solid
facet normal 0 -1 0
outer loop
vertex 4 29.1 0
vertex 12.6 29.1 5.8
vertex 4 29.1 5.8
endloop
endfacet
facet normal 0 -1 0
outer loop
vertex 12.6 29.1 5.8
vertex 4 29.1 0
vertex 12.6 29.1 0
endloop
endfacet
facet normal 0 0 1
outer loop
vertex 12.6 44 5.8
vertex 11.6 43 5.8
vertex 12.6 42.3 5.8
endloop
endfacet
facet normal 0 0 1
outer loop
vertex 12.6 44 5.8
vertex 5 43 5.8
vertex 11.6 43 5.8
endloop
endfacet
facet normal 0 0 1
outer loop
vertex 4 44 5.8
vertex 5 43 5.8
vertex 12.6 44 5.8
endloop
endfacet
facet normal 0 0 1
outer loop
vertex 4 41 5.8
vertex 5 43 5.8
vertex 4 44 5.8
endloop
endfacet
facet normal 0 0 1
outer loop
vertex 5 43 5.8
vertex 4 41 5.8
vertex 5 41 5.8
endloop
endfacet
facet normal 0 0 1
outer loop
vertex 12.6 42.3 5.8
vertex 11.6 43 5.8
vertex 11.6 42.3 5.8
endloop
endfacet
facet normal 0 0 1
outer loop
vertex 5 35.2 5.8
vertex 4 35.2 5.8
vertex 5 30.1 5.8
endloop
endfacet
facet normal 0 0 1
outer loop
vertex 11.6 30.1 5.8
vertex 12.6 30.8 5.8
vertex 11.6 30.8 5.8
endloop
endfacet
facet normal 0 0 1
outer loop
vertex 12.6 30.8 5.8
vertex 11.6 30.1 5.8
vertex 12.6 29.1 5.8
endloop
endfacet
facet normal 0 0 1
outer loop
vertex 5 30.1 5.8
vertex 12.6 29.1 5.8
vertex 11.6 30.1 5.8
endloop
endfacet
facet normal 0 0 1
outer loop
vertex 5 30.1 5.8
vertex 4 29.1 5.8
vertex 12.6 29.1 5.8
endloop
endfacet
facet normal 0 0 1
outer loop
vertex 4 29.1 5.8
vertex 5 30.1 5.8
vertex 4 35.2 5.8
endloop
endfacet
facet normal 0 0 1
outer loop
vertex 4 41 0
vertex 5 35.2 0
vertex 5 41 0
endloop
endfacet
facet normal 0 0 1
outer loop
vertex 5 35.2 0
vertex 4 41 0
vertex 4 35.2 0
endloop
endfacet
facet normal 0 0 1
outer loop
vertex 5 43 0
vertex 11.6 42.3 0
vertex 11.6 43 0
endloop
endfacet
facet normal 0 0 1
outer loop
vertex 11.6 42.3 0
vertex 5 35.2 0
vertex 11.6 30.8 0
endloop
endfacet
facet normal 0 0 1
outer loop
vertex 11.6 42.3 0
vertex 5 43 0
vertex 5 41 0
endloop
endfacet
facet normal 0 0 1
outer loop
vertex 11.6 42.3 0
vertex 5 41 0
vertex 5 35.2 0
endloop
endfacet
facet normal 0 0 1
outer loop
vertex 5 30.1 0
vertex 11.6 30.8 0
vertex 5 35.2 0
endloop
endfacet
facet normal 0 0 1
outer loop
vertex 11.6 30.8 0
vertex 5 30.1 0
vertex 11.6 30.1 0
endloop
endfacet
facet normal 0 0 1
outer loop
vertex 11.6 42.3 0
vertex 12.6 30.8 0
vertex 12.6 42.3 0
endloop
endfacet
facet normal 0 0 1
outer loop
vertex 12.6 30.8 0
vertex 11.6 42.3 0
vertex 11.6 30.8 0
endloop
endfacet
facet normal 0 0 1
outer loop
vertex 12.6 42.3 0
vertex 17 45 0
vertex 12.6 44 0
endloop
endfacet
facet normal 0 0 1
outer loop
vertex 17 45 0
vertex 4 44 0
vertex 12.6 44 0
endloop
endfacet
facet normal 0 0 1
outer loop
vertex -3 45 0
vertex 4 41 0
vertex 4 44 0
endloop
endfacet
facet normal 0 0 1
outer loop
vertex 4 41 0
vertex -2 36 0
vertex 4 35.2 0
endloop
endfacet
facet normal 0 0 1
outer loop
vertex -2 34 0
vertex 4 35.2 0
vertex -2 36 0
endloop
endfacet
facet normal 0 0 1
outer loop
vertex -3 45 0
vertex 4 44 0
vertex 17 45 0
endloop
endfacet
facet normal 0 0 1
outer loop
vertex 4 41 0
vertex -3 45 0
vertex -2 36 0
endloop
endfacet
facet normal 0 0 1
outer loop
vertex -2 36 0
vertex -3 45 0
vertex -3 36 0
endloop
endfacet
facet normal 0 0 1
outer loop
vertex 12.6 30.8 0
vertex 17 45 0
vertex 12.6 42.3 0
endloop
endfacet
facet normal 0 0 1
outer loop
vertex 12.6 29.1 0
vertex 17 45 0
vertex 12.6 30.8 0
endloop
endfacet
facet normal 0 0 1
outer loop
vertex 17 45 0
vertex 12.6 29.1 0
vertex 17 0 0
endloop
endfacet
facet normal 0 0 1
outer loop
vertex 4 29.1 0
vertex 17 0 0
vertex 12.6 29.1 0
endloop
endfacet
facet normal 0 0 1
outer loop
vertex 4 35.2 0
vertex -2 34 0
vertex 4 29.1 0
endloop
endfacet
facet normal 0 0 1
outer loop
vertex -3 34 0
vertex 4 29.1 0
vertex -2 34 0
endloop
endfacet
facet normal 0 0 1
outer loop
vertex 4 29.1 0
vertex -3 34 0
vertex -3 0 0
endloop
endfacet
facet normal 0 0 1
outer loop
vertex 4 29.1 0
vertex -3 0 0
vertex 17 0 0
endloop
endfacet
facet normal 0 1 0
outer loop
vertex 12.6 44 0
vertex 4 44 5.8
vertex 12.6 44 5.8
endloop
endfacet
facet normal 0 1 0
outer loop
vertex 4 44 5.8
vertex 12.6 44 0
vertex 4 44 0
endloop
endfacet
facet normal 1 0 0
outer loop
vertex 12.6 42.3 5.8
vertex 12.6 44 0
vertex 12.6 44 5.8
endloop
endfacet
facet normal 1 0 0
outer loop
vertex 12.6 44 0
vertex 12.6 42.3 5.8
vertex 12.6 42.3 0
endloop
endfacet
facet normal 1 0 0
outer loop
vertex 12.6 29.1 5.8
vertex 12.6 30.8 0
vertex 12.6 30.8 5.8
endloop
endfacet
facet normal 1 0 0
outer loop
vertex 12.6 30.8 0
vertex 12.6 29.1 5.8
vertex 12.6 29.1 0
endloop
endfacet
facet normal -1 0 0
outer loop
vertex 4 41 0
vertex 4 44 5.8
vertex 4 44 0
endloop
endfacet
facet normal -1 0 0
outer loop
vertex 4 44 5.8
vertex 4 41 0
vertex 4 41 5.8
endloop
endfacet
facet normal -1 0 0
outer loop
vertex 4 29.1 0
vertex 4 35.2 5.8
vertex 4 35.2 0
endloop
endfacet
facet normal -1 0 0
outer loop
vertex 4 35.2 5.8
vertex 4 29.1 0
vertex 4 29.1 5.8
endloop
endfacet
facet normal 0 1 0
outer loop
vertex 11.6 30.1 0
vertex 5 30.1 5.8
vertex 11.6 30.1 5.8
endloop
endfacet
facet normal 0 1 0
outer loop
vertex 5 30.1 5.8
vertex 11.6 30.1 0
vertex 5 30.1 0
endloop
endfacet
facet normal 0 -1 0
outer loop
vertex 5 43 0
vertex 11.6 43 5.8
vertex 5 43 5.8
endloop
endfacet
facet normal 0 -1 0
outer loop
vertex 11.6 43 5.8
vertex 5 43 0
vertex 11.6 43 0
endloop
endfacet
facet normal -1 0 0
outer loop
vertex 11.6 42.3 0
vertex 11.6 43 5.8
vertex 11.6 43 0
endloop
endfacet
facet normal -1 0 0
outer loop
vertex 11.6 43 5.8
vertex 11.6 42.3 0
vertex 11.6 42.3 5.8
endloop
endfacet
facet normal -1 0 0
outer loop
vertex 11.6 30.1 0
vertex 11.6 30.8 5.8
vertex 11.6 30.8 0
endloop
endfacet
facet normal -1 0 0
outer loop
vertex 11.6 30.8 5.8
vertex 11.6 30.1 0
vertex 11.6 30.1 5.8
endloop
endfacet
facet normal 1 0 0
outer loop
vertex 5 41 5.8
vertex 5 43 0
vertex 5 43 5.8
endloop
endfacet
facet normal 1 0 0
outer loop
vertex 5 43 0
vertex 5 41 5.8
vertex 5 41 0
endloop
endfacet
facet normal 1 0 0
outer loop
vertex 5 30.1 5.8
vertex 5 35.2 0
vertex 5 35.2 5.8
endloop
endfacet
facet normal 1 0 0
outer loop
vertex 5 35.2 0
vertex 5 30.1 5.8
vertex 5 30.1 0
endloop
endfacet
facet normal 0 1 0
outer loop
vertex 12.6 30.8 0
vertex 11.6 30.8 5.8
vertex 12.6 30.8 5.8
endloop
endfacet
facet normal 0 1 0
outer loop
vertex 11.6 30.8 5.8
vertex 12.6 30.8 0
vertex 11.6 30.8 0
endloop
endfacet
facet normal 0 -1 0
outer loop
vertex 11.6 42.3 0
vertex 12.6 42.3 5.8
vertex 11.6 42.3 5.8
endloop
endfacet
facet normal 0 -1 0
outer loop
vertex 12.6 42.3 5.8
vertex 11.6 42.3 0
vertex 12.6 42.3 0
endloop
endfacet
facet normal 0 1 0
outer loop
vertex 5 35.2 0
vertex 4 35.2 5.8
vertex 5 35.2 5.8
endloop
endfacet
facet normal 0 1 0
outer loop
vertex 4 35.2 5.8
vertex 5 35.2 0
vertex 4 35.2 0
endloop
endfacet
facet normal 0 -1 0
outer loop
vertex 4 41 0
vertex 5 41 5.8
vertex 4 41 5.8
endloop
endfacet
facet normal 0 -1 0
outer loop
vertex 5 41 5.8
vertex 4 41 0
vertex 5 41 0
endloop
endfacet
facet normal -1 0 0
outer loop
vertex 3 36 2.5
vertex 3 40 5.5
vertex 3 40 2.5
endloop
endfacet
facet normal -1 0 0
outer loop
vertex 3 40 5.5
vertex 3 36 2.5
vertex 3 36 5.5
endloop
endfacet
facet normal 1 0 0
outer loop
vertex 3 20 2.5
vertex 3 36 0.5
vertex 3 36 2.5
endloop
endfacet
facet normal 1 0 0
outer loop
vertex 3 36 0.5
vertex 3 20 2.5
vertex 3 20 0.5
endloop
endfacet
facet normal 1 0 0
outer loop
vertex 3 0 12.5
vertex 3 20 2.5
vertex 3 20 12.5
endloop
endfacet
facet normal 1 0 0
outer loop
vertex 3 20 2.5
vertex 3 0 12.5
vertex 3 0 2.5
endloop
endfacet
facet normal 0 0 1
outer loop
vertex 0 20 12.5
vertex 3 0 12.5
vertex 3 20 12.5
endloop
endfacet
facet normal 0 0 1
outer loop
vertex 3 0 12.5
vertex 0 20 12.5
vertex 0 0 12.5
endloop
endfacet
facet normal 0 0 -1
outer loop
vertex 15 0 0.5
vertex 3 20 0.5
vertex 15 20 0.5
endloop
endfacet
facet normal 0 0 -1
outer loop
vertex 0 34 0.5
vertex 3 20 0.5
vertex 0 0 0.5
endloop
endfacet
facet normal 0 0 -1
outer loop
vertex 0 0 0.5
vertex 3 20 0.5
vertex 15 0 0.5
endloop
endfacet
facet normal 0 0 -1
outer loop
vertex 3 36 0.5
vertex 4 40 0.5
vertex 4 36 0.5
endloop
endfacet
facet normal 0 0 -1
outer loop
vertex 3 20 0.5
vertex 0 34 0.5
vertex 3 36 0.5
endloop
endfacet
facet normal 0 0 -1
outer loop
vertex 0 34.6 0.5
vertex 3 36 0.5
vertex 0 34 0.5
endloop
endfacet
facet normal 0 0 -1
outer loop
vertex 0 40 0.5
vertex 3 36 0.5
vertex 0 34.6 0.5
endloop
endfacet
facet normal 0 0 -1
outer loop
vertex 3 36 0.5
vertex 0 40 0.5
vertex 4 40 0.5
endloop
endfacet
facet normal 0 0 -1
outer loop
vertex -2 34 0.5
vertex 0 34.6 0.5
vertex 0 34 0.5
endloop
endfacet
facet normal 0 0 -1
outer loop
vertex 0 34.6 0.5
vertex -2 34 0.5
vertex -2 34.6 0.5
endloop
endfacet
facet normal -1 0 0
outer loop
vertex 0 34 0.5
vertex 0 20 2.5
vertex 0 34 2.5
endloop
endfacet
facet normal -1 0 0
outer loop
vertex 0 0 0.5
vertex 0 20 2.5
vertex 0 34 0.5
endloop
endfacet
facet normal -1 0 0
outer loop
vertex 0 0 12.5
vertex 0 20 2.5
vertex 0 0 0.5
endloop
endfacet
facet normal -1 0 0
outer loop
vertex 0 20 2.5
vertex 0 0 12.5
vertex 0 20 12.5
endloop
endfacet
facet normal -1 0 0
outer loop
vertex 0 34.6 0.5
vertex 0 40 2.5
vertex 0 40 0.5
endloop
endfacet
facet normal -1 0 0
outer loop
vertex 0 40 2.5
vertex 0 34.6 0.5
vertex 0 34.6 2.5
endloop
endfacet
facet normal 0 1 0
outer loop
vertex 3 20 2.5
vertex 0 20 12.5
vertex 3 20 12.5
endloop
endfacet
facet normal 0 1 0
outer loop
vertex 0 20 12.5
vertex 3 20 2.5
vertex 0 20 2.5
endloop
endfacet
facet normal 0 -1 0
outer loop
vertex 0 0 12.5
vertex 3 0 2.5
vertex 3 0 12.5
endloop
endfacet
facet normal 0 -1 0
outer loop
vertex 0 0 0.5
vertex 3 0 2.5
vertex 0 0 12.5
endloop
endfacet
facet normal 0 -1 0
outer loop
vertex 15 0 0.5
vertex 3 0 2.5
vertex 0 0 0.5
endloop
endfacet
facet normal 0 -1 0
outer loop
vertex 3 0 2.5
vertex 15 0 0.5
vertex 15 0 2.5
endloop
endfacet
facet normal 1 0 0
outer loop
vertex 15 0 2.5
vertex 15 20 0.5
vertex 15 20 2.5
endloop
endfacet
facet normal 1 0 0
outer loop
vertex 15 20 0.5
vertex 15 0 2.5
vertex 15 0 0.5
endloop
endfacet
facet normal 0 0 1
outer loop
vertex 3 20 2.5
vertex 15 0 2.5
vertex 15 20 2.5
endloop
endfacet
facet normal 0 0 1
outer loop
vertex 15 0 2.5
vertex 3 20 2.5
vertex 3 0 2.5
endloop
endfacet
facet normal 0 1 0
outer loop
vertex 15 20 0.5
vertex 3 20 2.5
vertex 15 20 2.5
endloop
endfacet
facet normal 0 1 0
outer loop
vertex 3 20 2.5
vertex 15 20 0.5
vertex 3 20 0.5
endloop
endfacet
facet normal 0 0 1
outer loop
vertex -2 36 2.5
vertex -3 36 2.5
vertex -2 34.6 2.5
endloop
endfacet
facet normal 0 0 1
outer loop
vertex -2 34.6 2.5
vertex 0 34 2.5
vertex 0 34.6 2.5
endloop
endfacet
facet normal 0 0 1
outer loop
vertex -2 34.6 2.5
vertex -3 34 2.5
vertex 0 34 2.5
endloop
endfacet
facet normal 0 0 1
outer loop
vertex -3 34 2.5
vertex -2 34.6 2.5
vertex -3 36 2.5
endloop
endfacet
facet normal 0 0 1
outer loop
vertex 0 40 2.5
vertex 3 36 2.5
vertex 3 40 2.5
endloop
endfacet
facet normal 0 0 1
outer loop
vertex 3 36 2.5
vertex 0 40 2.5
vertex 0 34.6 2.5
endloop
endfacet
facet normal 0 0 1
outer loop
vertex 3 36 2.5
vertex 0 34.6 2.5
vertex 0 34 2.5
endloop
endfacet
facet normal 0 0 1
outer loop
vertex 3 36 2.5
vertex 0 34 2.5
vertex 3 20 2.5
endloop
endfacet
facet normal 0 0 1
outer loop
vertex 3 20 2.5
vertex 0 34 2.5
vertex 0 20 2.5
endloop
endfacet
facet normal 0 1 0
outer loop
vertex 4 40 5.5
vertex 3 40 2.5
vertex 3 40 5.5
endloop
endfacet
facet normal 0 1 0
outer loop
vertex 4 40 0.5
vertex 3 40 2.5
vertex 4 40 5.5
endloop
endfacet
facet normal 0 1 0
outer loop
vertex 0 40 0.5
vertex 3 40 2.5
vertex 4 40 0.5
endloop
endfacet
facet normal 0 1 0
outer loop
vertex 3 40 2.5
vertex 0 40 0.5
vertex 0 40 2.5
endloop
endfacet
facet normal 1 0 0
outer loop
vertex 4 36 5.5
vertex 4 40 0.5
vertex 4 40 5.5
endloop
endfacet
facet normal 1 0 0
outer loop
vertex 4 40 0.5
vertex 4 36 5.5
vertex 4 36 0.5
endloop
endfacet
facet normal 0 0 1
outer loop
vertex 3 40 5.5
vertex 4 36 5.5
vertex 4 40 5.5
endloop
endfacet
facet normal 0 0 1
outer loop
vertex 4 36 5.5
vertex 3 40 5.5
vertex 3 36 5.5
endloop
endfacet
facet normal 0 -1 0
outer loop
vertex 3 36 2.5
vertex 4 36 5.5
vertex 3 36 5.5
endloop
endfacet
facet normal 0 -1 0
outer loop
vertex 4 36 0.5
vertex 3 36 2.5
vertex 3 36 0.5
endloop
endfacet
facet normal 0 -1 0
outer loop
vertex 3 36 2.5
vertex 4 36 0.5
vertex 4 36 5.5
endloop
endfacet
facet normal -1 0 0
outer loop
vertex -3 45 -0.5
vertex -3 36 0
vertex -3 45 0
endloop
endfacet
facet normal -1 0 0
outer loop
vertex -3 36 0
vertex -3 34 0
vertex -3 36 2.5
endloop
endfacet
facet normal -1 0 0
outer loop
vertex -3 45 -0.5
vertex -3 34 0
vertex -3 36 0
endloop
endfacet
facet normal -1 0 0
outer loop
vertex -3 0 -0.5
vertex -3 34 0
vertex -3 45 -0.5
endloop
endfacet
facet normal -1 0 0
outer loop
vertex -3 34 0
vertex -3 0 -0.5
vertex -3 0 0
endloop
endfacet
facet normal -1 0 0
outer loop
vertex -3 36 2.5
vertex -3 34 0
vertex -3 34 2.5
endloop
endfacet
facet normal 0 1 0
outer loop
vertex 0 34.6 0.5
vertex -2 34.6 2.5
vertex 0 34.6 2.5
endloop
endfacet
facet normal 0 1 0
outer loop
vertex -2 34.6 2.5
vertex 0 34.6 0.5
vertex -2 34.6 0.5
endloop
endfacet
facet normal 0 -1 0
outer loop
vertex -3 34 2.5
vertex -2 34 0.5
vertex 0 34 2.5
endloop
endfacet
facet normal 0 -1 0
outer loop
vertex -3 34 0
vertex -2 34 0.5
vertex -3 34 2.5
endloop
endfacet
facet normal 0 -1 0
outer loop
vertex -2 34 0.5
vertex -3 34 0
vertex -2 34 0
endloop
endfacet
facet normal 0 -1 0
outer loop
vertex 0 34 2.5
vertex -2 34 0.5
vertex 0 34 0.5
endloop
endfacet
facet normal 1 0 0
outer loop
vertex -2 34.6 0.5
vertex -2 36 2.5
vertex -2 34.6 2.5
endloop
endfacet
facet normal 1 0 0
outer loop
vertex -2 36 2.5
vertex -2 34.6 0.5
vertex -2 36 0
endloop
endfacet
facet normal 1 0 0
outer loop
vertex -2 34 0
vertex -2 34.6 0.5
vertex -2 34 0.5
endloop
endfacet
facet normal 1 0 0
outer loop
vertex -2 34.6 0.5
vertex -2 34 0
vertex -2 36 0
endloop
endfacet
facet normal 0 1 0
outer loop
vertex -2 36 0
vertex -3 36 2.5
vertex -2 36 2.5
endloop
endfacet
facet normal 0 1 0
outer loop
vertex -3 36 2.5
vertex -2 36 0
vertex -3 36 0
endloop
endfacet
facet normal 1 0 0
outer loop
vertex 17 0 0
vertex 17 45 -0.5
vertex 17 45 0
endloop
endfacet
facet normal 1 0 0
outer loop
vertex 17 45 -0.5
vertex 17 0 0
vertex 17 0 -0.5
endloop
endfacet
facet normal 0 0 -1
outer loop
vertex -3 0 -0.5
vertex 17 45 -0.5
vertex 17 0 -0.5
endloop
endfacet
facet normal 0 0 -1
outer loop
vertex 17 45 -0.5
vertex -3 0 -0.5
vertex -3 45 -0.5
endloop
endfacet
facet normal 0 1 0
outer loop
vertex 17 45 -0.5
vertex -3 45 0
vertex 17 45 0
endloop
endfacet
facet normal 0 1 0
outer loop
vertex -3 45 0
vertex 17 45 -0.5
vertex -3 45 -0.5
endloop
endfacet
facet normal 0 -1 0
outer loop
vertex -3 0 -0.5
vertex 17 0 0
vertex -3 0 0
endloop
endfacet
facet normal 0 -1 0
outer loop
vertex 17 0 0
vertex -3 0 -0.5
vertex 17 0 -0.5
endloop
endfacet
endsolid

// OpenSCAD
// 12.9
// 5.8

 translate([5, 43]) rotate([0, 0, -90]) micro_switch_frame();

translate([0, 0, 0.5]) x();

translate([-3, 0, -0.5]) cube([20, 45, 0.5]);

module x() {
    cube([3, 20, 10+2]);
    cube([15, 20, 2]);
    cube([3, 40, 2]);
    translate([3, 40-4]) cube([1, 4, 5]);
    translate([-3, 40-6]) cube([3, 0.6, 2]);
    translate([-3, 40-6, -0.5]) cube([1, 2, 2+0.5]);
}

module micro_switch_frame(thickness=1) {
    micro_switch=[12.9, 6.6, 5.8];
    micro_switch_foot_area=[11.5, 4, micro_switch[2]];
    micro_switch_button_offset=2;

    difference() {
        translate([-thickness, -thickness, 0]) cube(micro_switch+[thickness*2, thickness*2, 0]);
        cube(micro_switch);
        translate([(micro_switch[0]-micro_switch_foot_area[0])/2, micro_switch[1], 0])
            cube(micro_switch_foot_area);
        translate([micro_switch_button_offset, -2, 0]) cube(micro_switch[2]);
    }
}

/*module cap(hole_pos=[2, 2],
    hole_d=2, 
    min_thickness=1,
    trigger_width=4,
    trigger_thickness=2,
    height=7,
    width=20,
    length=30) {

    translate([0, 0, height]) rotate([0, 90, 0]) 
        linear_extrude(height=width)
            difference() {
                polygon([[0, 0], [0, length], [min_thickness, length], [height, 0]]);
                translate(hole_pos) circle(d=hole_d, $fn=20);
            }
    translate([(width-trigger_width)/2, -trigger_thickness, 0]) 
        cube([trigger_width, trigger_thickness, height]);
}*/
